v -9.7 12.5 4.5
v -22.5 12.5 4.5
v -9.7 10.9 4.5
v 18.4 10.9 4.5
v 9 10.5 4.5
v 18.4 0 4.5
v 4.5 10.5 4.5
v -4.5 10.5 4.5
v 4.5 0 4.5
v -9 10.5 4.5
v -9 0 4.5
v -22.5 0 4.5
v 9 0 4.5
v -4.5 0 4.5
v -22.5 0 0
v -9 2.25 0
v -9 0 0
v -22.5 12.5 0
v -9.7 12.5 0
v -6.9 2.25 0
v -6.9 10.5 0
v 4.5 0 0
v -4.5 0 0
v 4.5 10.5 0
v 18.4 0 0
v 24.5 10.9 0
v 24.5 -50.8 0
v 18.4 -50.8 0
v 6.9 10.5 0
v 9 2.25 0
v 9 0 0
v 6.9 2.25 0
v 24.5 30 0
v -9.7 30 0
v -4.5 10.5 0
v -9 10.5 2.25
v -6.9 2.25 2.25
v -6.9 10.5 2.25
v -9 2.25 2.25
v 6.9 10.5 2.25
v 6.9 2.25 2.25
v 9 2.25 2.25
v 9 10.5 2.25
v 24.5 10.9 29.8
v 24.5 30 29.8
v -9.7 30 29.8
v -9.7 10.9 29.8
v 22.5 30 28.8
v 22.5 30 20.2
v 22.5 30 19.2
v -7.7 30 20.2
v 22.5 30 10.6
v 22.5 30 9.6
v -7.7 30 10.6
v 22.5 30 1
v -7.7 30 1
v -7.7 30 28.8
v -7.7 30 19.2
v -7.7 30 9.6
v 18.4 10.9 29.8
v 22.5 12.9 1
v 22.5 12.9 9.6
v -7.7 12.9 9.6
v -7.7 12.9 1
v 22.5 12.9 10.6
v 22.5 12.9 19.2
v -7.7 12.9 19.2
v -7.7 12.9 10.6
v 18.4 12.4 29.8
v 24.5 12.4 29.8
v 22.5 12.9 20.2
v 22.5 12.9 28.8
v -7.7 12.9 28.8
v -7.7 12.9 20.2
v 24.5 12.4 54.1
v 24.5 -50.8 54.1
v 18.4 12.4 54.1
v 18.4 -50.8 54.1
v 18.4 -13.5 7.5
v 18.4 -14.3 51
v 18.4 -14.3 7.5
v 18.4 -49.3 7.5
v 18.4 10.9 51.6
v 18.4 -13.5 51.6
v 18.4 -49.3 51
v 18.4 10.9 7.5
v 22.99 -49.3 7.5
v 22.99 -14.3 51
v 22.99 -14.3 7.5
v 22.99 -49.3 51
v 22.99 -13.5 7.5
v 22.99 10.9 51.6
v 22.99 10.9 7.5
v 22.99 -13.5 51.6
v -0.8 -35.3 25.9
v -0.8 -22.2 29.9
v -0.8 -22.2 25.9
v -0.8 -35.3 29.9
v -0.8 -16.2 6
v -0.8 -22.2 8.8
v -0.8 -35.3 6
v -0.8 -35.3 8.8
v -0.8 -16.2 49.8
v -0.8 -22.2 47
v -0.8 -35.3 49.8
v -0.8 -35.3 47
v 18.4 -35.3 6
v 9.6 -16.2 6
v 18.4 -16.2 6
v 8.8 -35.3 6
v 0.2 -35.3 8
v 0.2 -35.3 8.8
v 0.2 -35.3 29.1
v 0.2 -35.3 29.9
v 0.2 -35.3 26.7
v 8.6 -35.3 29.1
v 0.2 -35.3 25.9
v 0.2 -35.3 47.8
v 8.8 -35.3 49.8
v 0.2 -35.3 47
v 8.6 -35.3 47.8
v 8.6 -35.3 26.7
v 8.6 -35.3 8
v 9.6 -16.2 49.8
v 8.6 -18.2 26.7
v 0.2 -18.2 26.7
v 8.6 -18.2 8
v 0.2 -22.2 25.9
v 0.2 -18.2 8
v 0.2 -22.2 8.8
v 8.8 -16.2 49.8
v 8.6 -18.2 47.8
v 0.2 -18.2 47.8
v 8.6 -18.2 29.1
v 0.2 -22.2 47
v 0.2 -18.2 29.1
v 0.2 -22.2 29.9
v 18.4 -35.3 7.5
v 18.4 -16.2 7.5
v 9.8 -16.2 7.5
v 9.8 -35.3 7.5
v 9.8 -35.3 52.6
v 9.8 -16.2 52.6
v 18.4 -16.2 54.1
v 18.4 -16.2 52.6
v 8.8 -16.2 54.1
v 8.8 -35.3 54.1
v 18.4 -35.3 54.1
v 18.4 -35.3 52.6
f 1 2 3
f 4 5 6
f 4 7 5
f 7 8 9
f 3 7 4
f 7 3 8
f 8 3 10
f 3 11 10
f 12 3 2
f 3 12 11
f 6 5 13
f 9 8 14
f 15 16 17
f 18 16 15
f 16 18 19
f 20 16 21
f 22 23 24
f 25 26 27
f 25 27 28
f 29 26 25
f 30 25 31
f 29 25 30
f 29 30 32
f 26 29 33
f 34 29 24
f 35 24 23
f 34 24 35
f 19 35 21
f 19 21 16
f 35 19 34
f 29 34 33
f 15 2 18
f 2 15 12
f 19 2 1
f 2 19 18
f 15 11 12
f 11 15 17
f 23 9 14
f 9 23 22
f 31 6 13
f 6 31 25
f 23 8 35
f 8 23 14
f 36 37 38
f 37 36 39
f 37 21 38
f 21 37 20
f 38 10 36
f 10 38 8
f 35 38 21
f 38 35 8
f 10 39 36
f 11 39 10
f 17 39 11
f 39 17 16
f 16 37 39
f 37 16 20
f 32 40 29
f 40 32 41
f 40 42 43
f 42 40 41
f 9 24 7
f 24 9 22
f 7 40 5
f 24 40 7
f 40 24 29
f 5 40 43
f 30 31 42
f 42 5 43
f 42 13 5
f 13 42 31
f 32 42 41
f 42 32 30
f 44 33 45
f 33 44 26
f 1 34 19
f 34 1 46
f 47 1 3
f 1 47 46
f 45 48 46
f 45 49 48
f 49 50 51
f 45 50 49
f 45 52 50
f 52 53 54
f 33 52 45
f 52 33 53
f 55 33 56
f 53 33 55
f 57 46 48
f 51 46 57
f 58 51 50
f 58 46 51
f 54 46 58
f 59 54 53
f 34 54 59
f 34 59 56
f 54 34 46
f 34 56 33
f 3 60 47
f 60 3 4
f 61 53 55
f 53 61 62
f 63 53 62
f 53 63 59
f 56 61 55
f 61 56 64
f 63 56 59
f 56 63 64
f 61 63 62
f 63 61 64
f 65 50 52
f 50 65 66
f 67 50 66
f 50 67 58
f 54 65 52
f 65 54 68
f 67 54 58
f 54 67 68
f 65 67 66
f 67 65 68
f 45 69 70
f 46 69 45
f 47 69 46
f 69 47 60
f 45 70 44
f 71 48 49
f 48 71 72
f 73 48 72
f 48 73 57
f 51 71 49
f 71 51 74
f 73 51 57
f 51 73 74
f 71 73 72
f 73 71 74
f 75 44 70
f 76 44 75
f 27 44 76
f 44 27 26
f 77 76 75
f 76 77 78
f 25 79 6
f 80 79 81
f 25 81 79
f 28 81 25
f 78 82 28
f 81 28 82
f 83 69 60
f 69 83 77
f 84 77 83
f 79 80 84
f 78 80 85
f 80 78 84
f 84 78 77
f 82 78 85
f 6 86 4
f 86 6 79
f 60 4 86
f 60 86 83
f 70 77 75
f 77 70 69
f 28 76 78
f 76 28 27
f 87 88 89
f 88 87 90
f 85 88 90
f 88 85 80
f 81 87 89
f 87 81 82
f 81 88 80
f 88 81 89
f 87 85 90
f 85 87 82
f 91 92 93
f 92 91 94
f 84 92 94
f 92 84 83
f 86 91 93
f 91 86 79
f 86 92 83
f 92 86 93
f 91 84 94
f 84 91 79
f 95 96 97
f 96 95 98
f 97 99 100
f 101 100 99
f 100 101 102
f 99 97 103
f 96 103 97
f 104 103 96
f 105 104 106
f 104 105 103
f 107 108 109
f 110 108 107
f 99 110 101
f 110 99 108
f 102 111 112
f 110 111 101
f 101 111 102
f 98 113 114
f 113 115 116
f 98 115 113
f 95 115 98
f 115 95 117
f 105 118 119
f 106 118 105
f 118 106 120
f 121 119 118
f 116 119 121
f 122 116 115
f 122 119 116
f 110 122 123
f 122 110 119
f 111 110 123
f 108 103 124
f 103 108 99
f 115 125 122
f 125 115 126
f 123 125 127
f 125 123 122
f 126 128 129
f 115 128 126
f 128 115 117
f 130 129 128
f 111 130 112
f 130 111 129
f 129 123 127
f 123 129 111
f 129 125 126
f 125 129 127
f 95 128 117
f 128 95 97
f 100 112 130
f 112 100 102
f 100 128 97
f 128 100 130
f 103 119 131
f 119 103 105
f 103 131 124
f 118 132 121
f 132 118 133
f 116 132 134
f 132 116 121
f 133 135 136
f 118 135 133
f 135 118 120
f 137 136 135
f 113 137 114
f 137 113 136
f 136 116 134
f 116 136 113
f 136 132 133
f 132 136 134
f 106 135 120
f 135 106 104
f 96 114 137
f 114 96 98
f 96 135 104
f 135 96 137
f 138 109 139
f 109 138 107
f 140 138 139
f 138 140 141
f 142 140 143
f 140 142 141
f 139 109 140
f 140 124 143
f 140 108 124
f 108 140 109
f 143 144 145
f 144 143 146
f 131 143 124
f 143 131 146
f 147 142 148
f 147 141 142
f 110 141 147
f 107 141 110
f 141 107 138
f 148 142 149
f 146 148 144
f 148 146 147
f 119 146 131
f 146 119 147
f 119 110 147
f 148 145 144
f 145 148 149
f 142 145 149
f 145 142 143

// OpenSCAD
// file: pcb-model-sizes.scad
pcbSmtLvSize=[65.94, 33.75];
pcbDevkitcRelaySize=[57.53, 31.88];
pcbCurrentSensorSize=[35,43.5];
pcbContactorPsuSize=[24.4,44.1];
pcbContactorInterfaceRelaySize=[41.3,34.8];

pcbRelayHeight = 16;
pcbTallCompoent = 15;

pcbThickness = 1.6;
solderThickness = 3;
wallThickness = 1.5;
partitionThickness = 0.8;

caseMargin = 0.2;
// file: relay-current-enclosure.scad
include <pcb-model-sizes.scad>

currentTopStands=[6, 28];
currentBottomStands = [7, 27];
relayTopStands=[9, 42];
relayBottomStands = [12, 41];
standSize = 2;

module relayCurrentCase() {
    maxY = max(pcbCurrentSensorSize[0], pcbDevkitcRelaySize[1]);
    sizeX = 2 * wallThickness + partitionThickness + pcbDevkitcRelaySize[0] + pcbCurrentSensorSize[1];
    relayYOffset = (maxY - pcbDevkitcRelaySize[1]) / 2;
    difference() {
        cube([sizeX, 2 * wallThickness + maxY, wallThickness + pcbThickness + solderThickness]);
        translate([wallThickness - caseMargin, wallThickness + relayYOffset - caseMargin, wallThickness]) {
            cube([pcbDevkitcRelaySize[0] + 2 * caseMargin, pcbDevkitcRelaySize[1] + 2 * caseMargin, pcbThickness + solderThickness + 0.01]);
        }
        translate([wallThickness + pcbDevkitcRelaySize[0] + partitionThickness, wallThickness + (maxY - pcbCurrentSensorSize[0]) / 2, wallThickness]) {
            cube([pcbCurrentSensorSize[1], pcbCurrentSensorSize[0], pcbThickness + solderThickness + 0.01]);
        }
    }
    translate([wallThickness,wallThickness + relayYOffset,wallThickness]) {
        for(stand = relayBottomStands) {
            translate([stand, 0, 0]){
               cube([standSize, standSize, solderThickness]);
            }
        }
    }

    translate([wallThickness,wallThickness + relayYOffset + pcbDevkitcRelaySize[1] - standSize,wallThickness]) {
        for(stand = relayTopStands) {
            translate([stand, 0, 0]){
               #cube([standSize, standSize, solderThickness]);
            }
        }
    }

    translate([wallThickness + pcbDevkitcRelaySize[0] + partitionThickness,wallThickness,wallThickness]) {
        for(stand = currentBottomStands) {
            translate([stand, 0, 0]){
               cube([standSize, standSize, solderThickness]);
            }
        }
    }

    translate([wallThickness + pcbDevkitcRelaySize[0] + partitionThickness,wallThickness + pcbCurrentSensorSize[0] - standSize,wallThickness]) {
        for(stand = currentTopStands) {
            translate([stand, 0, 0]){
               cube([standSize, standSize, solderThickness]);
            }
        }
    }

    translate([0, 0, wallThickness + pcbThickness + solderThickness - 0.01]) {
        translate([wallThickness + caseMargin, 0, 0]) {
            cube([1 * wallThickness, wallThickness, 2 * wallThickness]);
        }

        translate([sizeX - wallThickness - caseMargin - 1 * wallThickness, 0, 0]) {
            cube([1 * wallThickness, wallThickness, 2 * wallThickness]);
        }

        translate([wallThickness + caseMargin, maxY + wallThickness, 0]) {
            cube([2 * wallThickness, wallThickness, 2 * wallThickness]);
        }

        translate([sizeX - wallThickness - caseMargin - 2 * wallThickness, maxY + wallThickness, 0]) {
            cube([2 * wallThickness, wallThickness, 2 * wallThickness]);
        }
    }
}

module relayCurrentCaseTop() {
    maxY = max(pcbCurrentSensorSize[0], pcbDevkitcRelaySize[1]);
    trayHeight = wallThickness + pcbThickness + solderThickness;

    difference() {
        cube([2 * wallThickness + partitionThickness + pcbDevkitcRelaySize[0] + pcbCurrentSensorSize[1], 4 * wallThickness + maxY, wallThickness + pcbThickness + solderThickness + pcbRelayHeight + wallThickness]);
        translate([-0.01, wallThickness - caseMargin, -0.01]) {
            cube([2 * wallThickness + partitionThickness + pcbDevkitcRelaySize[0] + pcbCurrentSensorSize[1] + 0.02, 2 * wallThickness + maxY + 2 * caseMargin, wallThickness + pcbThickness + solderThickness]);
        }
        translate([wallThickness -0.01, wallThickness, wallThickness + pcbThickness + solderThickness - 0.01]) {
            cube([partitionThickness + pcbDevkitcRelaySize[0] + pcbCurrentSensorSize[1] + 0.02, 2 * wallThickness + maxY, pcbRelayHeight + 0.01]);
        }
        for(hole=[[6,6], [33, 6], [51, 6], [pcbDevkitcRelaySize[0] + partitionThickness + 15.5, 6], [pcbDevkitcRelaySize[0] + partitionThickness + 39, 6]]) {
            translate([wallThickness + hole[0] - hole[1] / 2, - 0.01, 0]) {
                cube([hole[1], wallThickness + 0.02, trayHeight + hole[1]]);
            }
        }
        for(hole=[[16,6], [46, 4], [pcbDevkitcRelaySize[0] + partitionThickness + 28.5, 6]]) {
            translate([wallThickness + hole[0] - hole[1] / 2, 3 * wallThickness + maxY - 0.01, 0]) {
                cube([hole[1], wallThickness + 0.02, trayHeight + hole[1]]);
            }
        }
    }
}

module smtLvSled() {
    maxY = max(pcbCurrentSensorSize[0], pcbDevkitcRelaySize[1]);

    offsetY = maxY + (2 * wallThickness) - (pcbSmtLvSize[1] + 2 * wallThickness);

    difference() {
        union() {
            translate([0, 0, 0]) {
                cube([pcbSmtLvSize[0] + 2 * wallThickness, pcbSmtLvSize[1] + 2 * wallThickness, wallThickness + pcbTallCompoent + pcbThickness]);
            }
        }
        translate([wallThickness, 1 * wallThickness, wallThickness]) {
            cube([pcbSmtLvSize[0], pcbSmtLvSize[1] + 0 * wallThickness + 0.01, pcbTallCompoent + pcbThickness + 0.01]);
        }

        translate([wallThickness, wallThickness, pcbTallCompoent / 2]) {
            cube([pcbSmtLvSize[0], pcbSmtLvSize[1] + wallThickness + 0.01, pcbTallCompoent / 2 + pcbThickness + wallThickness + 0.01]);
        }
    }
    translate([pcbSmtLvSize[0] / 4 - wallThickness, wallThickness, wallThickness]) {
        cube([wallThickness * 2, wallThickness * 3, pcbTallCompoent]);
    }
    translate([ 3 * pcbSmtLvSize[0] / 4 - wallThickness, wallThickness, wallThickness]) {
        cube([wallThickness * 2, wallThickness * 3, pcbTallCompoent]);
    }

    translate([pcbSmtLvSize[0] / 4 - wallThickness, wallThickness, wallThickness]) {
        cube([wallThickness * 2, wallThickness * 3, pcbTallCompoent]);
    }
    translate([ 3 * pcbSmtLvSize[0] / 4 - wallThickness, wallThickness, wallThickness]) {
        cube([wallThickness * 2, wallThickness * 3, pcbTallCompoent]);
    }

    translate([pcbSmtLvSize[0] / 4 - wallThickness, wallThickness + pcbSmtLvSize[1] - wallThickness * 1, wallThickness]) {
        #cube([wallThickness * 2, wallThickness * 2, pcbTallCompoent]);
    }

    translate([3 * pcbSmtLvSize[0] / 4 - wallThickness, wallThickness + pcbSmtLvSize[1] - wallThickness * 1, wallThickness]) {
        #cube([wallThickness * 2, wallThickness * 2, pcbTallCompoent]);
    }

    translate([0, -offsetY - 1.4, 0]) {
        cube([pcbSmtLvSize[0] + 2 * wallThickness, maxY + 4 * wallThickness + 2.8, wallThickness]);
    }

    translate([0, -offsetY - 1.4 - wallThickness, -3 * wallThickness]) {
        cube([pcbSmtLvSize[0] + 2 * wallThickness, wallThickness, 4 * wallThickness]);
    }

    translate([0, maxY + 3 * wallThickness + 1.4, -3 * wallThickness]) {
        cube([pcbSmtLvSize[0] + 2 * wallThickness, wallThickness, 4 * wallThickness]);
    }

}

*relayCurrentCase();


translate([0, -wallThickness, wallThickness + pcbThickness + solderThickness + 2]) {
    *relayCurrentCaseTop();
}

translate([0, 0, 15 + pcbRelayHeight + wallThickness]) {
    smtLvSled();
}
// file: pcb-models.scad
module pcbDevkitcRelay() {
    rotate([-90, 0, 0]) {
        scale(1000) {
            import("pcb-models/access-control-devkitc-relay.stl");
        }
    }
}

module pcbDevkitcPsu() {
    rotate([-90, 0, 0]) {
        scale(1000) {
            import("pcb-models/access-control-devkitc-relay.stl");
        }
    }
}

module pcbCurrentSensor() {
    rotate([-90, 0, 0]) {
        scale(1000) {
            import("pcb-models/current-sensor-pcb.stl");
        }
    }
}

module pcbSmtLv() {
    rotate([-90, 0, 0]) {
        scale(1000) {
            import("pcb-models/access-control-smt-lv.stl");
        }
    }
}

module pcbContactorPsu() {
    rotate([-90, 0, 0]) {
        scale(1) {
            import("pcb-models/contactor-psu.stl");
        }
    }
}
// main file
fullContactorWidth=45; /*45.3*/
centerWingWidth=18;
centerInnerWingWidth=14;
centerInnerGap=9; /*8.9*/
centerOuterGap=22;
centerToPortEdge = centerOuterGap;
centerWingWall=2.25;
centerWingDepth=10.5;
centerWingSlotDepth=7;
centerToFarEdge = 19;
slotGap = 0.15;
pcbWidth=50;
pcbLength=66;
zeroOffsetToContactorCenter=-5;
pcbWallWidth=2;
pcbClearance=0.5;
pcbClearanceTop=1;
sideWidth = (fullContactorWidth - centerOuterGap) / 2 - centerWingWall;
gapWidth = fullContactorWidth / 2 - sideWidth;
verticalSupportWidth = 20;

wago221s415 = [30.2, 18.6 - 1.5, 8.6];
wago221s413 = [18.7, 18.6 - 1.5, 8.4];
wagoWallWidthH = 1;
wagoWallWidthV = 2;
wagoWireD = 6;
wagoLeaverOffset = 4;
wagoInterallWall = 0.8;

jstWireThickness = 2;
psuHeight = 3 * wagoWallWidthH + 3 * wago221s415[2];/*22.5*/

use <pcb-models.scad>
use <relay-current-enclosure.scad>
include <pcb-model-sizes.scad>

module contactorInterfaceSMT615() {

    difference() {
        translate([-fullContactorWidth / 2, 0, 0]) {
            union() {
                sideWidth = (fullContactorWidth - centerOuterGap) / 2 - centerWingWall;
                cube([fullContactorWidth, centerToFarEdge / 2 + 3, 2 * centerWingWall]);
            }
        }
        translate([-centerInnerGap / 2 - centerWingWall - slotGap, 0, 0]) {
            cube([centerWingWall + slotGap, centerWingDepth, centerWingWall]);
        }

        translate([-centerInnerGap / 2 - 2 * centerWingWall, 0, 0]) {
            cube([centerWingWall, centerWingWall, centerWingWall]);
        }

        translate([centerInnerGap / 2, 0, 0]) {
            cube([centerWingWall + slotGap, centerWingDepth, centerWingWall]);
        }

        translate([centerInnerGap / 2 + 1 * centerWingWall, 0, 0]) {
            cube([centerWingWall, centerWingWall, centerWingWall]);
        }

        translate([-centerInnerGap / 2 - (centerWingWall * 2), 0, centerWingWall]) {
            cube([2 * centerWingWall, centerWingDepth, centerWingWall]);
        }

        translate([centerInnerGap / 2 - (centerWingWall * 0), 0, centerWingWall]) {
            cube([2 * centerWingWall, centerWingDepth, centerWingWall]);
        }
    }

    halfWidthNotWago = (pcbWidth - wago221s415[0] - 2 * wagoWallWidthV)/2;

    translate([fullContactorWidth / 2 + pcbWallWidth - (wago221s415[0] + 2 * wagoWallWidthV), pcbLength / 2 + zeroOffsetToContactorCenter - (wago221s415[1] + wagoWallWidthV) + pcbWallWidth, /*centerWingWall * 2 + pcbClearance*/]){
        wagoPort415();
        translate([0, 0, wagoWallWidthH + wago221s415[2]]) {
            wagoPort415();
        }
        translate([0, 0, 2 * wagoWallWidthH + 2 * wago221s415[2]]) {
            wagoPort415();
        }
    }

    translate([fullContactorWidth / 2 + pcbWallWidth - pcbThickness - solderThickness - wallThickness , zeroOffsetToContactorCenter + pcbLength / 2 + 1 * pcbWallWidth - wago221s415[1] - 3 * wagoWallWidthH - pcbCurrentSensorSize[0] - pcbContactorPsuSize[0] - 2 * wallThickness - partitionThickness + 2.5, 0]) {
        maxOuterSize = 2 * wallThickness + max(pcbCurrentSensorSize[1], pcbContactorPsuSize[1]) + centerWingWall * 2 + 1 * pcbClearance + wagoWallWidthV;
        difference() {
            cube([pcbThickness + solderThickness + wallThickness, pcbCurrentSensorSize[0] + pcbContactorPsuSize[0] + 2 * wallThickness + partitionThickness + 0, maxOuterSize]);
            translate([-0.01, wallThickness, centerWingWall * 2 + 1 * pcbClearance + 0.5 + wagoWallWidthV]) {
                cube([pcbThickness + solderThickness, pcbCurrentSensorSize[0], pcbCurrentSensorSize[1]]);
            }

            translate([-0.01, wallThickness + pcbCurrentSensorSize[0] + partitionThickness,centerWingWall * 2 + 1 * pcbClearance + 0.5 + wagoWallWidthV]) {
                cube([pcbThickness + solderThickness, pcbContactorPsuSize[0], pcbContactorPsuSize[1]]);
            }
        }

        translate([-wago221s415[2] - 2 * wagoWallWidthH - wago221s415[2], wago221s415[1] + 3 * wagoWireD + wallThickness - jstWireThickness , 2 * centerWingWall + wagoWallWidthH + 0.5]) {

            rotate([180, -90, 0]) { 
                wagoPort413(true);
            }

            translate([0,0, wago221s413[1] + 2 * wagoWallWidthV]) {
                rotate([180, -90, 0]) { 
                    #wagoPort413(true);
                }
            }

            translate([wago221s415[2] + 2 * wagoWallWidthH, -wago221s415[1] - wagoWallWidthV, 0]) {
                cube([wago221s415[2], wago221s415[1] + wagoWallWidthV, wallThickness]);

                translate([-wagoWallWidthH, 0, 0]) {
                    cube([wagoWallWidthH, wago221s415[1] + wagoWallWidthV, maxOuterSize - (2 * centerWingWall + wagoWallWidthH) - 0.5]);
                }

                translate([0, 0, (maxOuterSize - (2 * centerWingWall + wagoWallWidthH)) - wagoWallWidthV]) {
                    cube([wago221s415[2], wago221s415[1] + wagoWallWidthV, wallThickness]);
                }
            }
        }

    }


    *translate([fullContactorWidth / 2 - solderThickness,-14,pcbCurrentSensorSize[1] + centerWingWall * 2 + 2 * pcbClearance + wagoWallWidthV]) {
        rotate([90, 0, 0]) {
            rotate([0,-90, 0]) {
                color("green") pcbCurrentSensor();
            }
        }
    }

    *translate([fullContactorWidth / 2 - solderThickness,11, centerWingWall * 2 + 2 * pcbClearance + wagoWallWidthV]) {
        psuVertical();
    }
}

module psuVertical() {
    translate([-1.0,7.5,0]) {
        rotate([0, 0, 0]) {
            rotate([0,-90, 0]) {
                color("green") pcbContactorPsu();
            }
        }
    }
}


module wagoPort415() {  
    difference(){
        cube([wago221s415[0] + 2 * wagoWallWidthV, wago221s415[1] + wagoWallWidthV, wago221s415[2] + 2 * wagoWallWidthH]);
        translate([wagoWallWidthV, wagoWallWidthV, wagoWallWidthH]) {
            cube([wago221s415[0], wago221s415[1] + 0.01, wago221s415[2]]);
        }
    }
}

module wagoPort413(open=false) {  
    difference(){
        cube([wago221s413[0] + 2 * wagoWallWidthV, wago221s413[1] + wagoWallWidthV, wago221s413[2] + 2 * wagoWallWidthH]);
        translate([wagoWallWidthV, wagoWallWidthV, wagoWallWidthH]) {
            cube([wago221s413[0], wago221s413[1] + 0.01, wago221s413[2]]);
        }

        if (open) {
            translate([wagoWallWidthV + wagoInterallWall,wagoWallWidthV + wagoLeaverOffset,-0.01]) {
                cube([wago221s413[0] - 2 * wagoInterallWall, wago221s413[1] - wagoLeaverOffset + 0.01, wagoWallWidthH + 0.02]);
            }
        }
    }
}

module maxWidthPort() {
    difference() {
        cube([pcbWallWidth * 2 + pcbWidth, wago221s415[1] + pcbWallWidth, wago221s415[2] + 2 * pcbWallWidth]);
        translate([pcbWallWidth, -0.01, pcbWallWidth]) {
            cube([pcbWidth, wago221s415[1] + 0.01, wago221s415[2]]);
        }
    }
}


contactorInterfaceSMT615();
